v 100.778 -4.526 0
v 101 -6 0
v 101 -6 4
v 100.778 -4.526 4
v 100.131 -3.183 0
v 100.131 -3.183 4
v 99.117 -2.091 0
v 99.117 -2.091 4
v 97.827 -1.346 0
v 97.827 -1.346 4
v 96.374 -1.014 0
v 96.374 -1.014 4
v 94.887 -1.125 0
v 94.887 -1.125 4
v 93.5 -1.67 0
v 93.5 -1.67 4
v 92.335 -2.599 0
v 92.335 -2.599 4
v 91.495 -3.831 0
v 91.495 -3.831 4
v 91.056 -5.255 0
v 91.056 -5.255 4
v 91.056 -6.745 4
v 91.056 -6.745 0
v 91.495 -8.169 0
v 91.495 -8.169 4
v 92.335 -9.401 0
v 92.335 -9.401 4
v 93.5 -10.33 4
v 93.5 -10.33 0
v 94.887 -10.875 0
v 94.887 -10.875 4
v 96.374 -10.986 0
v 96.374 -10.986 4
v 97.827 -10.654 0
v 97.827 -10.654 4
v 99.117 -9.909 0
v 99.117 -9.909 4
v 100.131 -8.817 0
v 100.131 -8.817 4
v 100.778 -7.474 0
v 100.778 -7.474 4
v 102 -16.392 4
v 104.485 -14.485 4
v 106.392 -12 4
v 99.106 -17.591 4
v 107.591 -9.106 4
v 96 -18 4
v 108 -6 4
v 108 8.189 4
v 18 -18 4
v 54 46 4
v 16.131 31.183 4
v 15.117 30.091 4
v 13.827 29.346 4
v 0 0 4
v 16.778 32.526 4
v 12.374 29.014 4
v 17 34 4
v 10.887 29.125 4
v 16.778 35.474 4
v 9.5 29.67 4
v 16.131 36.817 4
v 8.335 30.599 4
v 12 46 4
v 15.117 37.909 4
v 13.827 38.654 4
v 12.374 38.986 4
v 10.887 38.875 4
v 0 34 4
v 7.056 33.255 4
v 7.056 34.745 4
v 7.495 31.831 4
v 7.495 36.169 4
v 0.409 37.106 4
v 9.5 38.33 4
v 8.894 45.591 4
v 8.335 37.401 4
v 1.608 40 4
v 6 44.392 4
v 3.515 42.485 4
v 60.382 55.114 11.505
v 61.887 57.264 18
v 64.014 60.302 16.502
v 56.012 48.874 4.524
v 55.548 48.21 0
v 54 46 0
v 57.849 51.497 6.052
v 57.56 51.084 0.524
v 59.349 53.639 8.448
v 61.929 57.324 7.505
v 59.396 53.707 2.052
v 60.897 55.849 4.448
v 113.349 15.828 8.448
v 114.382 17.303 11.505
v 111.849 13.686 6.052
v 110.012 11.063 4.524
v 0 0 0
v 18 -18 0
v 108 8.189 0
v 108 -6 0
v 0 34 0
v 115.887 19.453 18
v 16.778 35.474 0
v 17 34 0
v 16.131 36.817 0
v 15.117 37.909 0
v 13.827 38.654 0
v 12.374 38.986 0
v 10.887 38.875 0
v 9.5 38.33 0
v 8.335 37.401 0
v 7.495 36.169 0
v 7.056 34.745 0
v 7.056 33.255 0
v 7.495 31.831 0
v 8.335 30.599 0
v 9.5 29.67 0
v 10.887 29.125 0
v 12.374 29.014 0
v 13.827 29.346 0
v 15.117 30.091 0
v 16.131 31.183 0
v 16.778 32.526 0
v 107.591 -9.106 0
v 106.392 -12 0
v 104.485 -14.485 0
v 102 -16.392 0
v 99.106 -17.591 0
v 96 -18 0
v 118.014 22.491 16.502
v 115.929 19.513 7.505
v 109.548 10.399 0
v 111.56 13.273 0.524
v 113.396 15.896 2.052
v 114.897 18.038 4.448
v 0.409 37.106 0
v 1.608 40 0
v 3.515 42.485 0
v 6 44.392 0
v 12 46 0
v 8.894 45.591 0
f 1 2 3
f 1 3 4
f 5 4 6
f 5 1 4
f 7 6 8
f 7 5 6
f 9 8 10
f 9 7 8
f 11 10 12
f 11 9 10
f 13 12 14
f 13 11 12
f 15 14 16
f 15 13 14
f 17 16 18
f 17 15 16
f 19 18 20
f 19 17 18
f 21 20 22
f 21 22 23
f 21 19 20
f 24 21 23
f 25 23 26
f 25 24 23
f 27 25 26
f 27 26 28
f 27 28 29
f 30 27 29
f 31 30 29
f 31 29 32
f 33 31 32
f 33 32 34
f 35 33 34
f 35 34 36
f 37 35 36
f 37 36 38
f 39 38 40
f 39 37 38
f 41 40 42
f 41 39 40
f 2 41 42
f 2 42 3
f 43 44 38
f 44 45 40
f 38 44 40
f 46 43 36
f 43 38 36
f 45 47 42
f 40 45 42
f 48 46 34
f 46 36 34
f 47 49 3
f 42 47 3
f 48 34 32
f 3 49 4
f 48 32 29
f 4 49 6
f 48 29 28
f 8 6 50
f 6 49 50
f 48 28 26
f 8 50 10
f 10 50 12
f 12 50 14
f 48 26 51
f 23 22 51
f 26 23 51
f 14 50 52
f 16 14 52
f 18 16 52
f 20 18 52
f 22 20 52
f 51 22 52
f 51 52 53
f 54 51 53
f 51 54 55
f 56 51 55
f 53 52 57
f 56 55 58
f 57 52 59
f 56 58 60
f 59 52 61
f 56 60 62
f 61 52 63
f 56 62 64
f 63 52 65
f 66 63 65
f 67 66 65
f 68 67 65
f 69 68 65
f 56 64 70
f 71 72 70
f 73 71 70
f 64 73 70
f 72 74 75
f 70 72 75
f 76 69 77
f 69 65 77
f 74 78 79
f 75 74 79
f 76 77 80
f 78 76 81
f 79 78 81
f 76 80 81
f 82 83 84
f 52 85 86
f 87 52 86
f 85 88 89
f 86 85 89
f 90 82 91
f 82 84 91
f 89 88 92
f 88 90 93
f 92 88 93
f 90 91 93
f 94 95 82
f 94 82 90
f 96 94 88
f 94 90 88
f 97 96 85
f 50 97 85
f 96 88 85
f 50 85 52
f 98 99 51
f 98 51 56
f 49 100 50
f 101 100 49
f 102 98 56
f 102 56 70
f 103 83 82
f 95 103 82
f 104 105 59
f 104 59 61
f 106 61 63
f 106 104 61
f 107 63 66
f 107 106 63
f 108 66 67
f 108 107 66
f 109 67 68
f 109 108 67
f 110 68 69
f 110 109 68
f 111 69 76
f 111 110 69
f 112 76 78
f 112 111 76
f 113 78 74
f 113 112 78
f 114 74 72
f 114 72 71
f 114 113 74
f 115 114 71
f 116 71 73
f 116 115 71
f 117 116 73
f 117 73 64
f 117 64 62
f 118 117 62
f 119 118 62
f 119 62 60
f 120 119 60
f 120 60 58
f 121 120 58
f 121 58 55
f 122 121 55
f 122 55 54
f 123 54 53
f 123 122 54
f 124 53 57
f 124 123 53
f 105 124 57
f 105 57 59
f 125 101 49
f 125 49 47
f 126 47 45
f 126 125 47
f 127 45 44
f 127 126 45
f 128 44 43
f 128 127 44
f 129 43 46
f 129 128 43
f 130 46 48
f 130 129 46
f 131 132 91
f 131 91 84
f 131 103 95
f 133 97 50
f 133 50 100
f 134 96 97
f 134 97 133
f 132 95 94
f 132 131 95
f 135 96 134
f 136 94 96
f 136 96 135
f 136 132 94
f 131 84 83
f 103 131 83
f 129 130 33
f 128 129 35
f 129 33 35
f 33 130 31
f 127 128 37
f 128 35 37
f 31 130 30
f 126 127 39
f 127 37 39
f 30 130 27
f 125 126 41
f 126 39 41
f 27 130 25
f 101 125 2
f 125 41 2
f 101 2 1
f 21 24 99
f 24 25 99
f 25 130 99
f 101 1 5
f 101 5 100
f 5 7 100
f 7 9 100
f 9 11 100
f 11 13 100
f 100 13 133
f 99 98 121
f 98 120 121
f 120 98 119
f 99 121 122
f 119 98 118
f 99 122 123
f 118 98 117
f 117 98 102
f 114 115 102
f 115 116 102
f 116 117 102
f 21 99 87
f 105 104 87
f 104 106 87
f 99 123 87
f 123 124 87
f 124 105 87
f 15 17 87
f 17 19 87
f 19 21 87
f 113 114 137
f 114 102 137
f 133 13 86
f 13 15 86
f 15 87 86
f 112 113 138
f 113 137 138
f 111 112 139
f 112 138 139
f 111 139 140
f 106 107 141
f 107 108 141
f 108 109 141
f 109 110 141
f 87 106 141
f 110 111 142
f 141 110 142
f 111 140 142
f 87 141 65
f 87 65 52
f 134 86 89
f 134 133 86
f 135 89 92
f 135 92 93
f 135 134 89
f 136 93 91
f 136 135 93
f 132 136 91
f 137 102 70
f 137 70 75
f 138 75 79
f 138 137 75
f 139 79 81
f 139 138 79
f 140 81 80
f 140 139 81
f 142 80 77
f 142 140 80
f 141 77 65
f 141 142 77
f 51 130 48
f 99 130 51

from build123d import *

# Parameters (mm, degrees)
SKETCH1_R           = 5
BOSS_EXTRUDE1_DEPTH = 4
BOSS_EXTRUDE2_START = -65.921828
BOSS_EXTRUDE2_DEPTH = 65.921828
FILLET1_R           = 12


with BuildPart() as part:
    # Sketch1 → Boss-Extrude1 (new body)
    with BuildSketch(Plane.XY):
        with BuildLine():
            Line((0, 0), (0, 34))
            ThreePointArc((0, 34), (3.514718626, 42.485281374), (12, 46))
            Line((12, 46), (54, 46))
            Line((54, 46), (108, 8.188792937))
            Line((108, 8.188792937), (108, -6))
            ThreePointArc((108, -6), (104.485281374, -14.485281374), (96, -18))
            Line((96, -18), (18, -18))
            Line((18, -18), (0, 0))
        make_face()
        with Locations((12, 34)):
            Circle(SKETCH1_R, mode=Mode.SUBTRACT)
        with Locations((96, -6)):
            Circle(SKETCH1_R, mode=Mode.SUBTRACT)
    extrude(amount=BOSS_EXTRUDE1_DEPTH)

    # Sketch5 → Boss-Extrude2 (add)
    with BuildSketch(Plane(origin=(68.621613592, -48.049371121, 0), x_dir=(0, 0, -1), z_dir=(0.819152044288997, -0.5735764363510386, 0)).offset(BOSS_EXTRUDE2_START)):
        with BuildLine():
            Line((-4, 68.6541216), (0, 68.6541216))
            Line((0, 68.6541216), (0, 79.44625787))
            Line((0, 79.44625787), (-16.501573626, 86.113326382))
            Line((-16.501573626, 86.113326382), (-18, 82.404590964))
            Line((-18, 82.404590964), (-11.504720879, 79.780327855))
            ThreePointArc((-11.504720879, 79.780327855), (-6.051549129, 75.364436442), (-4, 68.6541216))
        make_face()
    extrude(amount=BOSS_EXTRUDE2_DEPTH)

    # Fillet1
    fillet1_edges = [part.edges().sort_by_distance(p)[0] for p in [
        (87.190114977, 35.934797015, 0),
    ]]
    fillet(fillet1_edges, radius=FILLET1_R)


solid = part.part
